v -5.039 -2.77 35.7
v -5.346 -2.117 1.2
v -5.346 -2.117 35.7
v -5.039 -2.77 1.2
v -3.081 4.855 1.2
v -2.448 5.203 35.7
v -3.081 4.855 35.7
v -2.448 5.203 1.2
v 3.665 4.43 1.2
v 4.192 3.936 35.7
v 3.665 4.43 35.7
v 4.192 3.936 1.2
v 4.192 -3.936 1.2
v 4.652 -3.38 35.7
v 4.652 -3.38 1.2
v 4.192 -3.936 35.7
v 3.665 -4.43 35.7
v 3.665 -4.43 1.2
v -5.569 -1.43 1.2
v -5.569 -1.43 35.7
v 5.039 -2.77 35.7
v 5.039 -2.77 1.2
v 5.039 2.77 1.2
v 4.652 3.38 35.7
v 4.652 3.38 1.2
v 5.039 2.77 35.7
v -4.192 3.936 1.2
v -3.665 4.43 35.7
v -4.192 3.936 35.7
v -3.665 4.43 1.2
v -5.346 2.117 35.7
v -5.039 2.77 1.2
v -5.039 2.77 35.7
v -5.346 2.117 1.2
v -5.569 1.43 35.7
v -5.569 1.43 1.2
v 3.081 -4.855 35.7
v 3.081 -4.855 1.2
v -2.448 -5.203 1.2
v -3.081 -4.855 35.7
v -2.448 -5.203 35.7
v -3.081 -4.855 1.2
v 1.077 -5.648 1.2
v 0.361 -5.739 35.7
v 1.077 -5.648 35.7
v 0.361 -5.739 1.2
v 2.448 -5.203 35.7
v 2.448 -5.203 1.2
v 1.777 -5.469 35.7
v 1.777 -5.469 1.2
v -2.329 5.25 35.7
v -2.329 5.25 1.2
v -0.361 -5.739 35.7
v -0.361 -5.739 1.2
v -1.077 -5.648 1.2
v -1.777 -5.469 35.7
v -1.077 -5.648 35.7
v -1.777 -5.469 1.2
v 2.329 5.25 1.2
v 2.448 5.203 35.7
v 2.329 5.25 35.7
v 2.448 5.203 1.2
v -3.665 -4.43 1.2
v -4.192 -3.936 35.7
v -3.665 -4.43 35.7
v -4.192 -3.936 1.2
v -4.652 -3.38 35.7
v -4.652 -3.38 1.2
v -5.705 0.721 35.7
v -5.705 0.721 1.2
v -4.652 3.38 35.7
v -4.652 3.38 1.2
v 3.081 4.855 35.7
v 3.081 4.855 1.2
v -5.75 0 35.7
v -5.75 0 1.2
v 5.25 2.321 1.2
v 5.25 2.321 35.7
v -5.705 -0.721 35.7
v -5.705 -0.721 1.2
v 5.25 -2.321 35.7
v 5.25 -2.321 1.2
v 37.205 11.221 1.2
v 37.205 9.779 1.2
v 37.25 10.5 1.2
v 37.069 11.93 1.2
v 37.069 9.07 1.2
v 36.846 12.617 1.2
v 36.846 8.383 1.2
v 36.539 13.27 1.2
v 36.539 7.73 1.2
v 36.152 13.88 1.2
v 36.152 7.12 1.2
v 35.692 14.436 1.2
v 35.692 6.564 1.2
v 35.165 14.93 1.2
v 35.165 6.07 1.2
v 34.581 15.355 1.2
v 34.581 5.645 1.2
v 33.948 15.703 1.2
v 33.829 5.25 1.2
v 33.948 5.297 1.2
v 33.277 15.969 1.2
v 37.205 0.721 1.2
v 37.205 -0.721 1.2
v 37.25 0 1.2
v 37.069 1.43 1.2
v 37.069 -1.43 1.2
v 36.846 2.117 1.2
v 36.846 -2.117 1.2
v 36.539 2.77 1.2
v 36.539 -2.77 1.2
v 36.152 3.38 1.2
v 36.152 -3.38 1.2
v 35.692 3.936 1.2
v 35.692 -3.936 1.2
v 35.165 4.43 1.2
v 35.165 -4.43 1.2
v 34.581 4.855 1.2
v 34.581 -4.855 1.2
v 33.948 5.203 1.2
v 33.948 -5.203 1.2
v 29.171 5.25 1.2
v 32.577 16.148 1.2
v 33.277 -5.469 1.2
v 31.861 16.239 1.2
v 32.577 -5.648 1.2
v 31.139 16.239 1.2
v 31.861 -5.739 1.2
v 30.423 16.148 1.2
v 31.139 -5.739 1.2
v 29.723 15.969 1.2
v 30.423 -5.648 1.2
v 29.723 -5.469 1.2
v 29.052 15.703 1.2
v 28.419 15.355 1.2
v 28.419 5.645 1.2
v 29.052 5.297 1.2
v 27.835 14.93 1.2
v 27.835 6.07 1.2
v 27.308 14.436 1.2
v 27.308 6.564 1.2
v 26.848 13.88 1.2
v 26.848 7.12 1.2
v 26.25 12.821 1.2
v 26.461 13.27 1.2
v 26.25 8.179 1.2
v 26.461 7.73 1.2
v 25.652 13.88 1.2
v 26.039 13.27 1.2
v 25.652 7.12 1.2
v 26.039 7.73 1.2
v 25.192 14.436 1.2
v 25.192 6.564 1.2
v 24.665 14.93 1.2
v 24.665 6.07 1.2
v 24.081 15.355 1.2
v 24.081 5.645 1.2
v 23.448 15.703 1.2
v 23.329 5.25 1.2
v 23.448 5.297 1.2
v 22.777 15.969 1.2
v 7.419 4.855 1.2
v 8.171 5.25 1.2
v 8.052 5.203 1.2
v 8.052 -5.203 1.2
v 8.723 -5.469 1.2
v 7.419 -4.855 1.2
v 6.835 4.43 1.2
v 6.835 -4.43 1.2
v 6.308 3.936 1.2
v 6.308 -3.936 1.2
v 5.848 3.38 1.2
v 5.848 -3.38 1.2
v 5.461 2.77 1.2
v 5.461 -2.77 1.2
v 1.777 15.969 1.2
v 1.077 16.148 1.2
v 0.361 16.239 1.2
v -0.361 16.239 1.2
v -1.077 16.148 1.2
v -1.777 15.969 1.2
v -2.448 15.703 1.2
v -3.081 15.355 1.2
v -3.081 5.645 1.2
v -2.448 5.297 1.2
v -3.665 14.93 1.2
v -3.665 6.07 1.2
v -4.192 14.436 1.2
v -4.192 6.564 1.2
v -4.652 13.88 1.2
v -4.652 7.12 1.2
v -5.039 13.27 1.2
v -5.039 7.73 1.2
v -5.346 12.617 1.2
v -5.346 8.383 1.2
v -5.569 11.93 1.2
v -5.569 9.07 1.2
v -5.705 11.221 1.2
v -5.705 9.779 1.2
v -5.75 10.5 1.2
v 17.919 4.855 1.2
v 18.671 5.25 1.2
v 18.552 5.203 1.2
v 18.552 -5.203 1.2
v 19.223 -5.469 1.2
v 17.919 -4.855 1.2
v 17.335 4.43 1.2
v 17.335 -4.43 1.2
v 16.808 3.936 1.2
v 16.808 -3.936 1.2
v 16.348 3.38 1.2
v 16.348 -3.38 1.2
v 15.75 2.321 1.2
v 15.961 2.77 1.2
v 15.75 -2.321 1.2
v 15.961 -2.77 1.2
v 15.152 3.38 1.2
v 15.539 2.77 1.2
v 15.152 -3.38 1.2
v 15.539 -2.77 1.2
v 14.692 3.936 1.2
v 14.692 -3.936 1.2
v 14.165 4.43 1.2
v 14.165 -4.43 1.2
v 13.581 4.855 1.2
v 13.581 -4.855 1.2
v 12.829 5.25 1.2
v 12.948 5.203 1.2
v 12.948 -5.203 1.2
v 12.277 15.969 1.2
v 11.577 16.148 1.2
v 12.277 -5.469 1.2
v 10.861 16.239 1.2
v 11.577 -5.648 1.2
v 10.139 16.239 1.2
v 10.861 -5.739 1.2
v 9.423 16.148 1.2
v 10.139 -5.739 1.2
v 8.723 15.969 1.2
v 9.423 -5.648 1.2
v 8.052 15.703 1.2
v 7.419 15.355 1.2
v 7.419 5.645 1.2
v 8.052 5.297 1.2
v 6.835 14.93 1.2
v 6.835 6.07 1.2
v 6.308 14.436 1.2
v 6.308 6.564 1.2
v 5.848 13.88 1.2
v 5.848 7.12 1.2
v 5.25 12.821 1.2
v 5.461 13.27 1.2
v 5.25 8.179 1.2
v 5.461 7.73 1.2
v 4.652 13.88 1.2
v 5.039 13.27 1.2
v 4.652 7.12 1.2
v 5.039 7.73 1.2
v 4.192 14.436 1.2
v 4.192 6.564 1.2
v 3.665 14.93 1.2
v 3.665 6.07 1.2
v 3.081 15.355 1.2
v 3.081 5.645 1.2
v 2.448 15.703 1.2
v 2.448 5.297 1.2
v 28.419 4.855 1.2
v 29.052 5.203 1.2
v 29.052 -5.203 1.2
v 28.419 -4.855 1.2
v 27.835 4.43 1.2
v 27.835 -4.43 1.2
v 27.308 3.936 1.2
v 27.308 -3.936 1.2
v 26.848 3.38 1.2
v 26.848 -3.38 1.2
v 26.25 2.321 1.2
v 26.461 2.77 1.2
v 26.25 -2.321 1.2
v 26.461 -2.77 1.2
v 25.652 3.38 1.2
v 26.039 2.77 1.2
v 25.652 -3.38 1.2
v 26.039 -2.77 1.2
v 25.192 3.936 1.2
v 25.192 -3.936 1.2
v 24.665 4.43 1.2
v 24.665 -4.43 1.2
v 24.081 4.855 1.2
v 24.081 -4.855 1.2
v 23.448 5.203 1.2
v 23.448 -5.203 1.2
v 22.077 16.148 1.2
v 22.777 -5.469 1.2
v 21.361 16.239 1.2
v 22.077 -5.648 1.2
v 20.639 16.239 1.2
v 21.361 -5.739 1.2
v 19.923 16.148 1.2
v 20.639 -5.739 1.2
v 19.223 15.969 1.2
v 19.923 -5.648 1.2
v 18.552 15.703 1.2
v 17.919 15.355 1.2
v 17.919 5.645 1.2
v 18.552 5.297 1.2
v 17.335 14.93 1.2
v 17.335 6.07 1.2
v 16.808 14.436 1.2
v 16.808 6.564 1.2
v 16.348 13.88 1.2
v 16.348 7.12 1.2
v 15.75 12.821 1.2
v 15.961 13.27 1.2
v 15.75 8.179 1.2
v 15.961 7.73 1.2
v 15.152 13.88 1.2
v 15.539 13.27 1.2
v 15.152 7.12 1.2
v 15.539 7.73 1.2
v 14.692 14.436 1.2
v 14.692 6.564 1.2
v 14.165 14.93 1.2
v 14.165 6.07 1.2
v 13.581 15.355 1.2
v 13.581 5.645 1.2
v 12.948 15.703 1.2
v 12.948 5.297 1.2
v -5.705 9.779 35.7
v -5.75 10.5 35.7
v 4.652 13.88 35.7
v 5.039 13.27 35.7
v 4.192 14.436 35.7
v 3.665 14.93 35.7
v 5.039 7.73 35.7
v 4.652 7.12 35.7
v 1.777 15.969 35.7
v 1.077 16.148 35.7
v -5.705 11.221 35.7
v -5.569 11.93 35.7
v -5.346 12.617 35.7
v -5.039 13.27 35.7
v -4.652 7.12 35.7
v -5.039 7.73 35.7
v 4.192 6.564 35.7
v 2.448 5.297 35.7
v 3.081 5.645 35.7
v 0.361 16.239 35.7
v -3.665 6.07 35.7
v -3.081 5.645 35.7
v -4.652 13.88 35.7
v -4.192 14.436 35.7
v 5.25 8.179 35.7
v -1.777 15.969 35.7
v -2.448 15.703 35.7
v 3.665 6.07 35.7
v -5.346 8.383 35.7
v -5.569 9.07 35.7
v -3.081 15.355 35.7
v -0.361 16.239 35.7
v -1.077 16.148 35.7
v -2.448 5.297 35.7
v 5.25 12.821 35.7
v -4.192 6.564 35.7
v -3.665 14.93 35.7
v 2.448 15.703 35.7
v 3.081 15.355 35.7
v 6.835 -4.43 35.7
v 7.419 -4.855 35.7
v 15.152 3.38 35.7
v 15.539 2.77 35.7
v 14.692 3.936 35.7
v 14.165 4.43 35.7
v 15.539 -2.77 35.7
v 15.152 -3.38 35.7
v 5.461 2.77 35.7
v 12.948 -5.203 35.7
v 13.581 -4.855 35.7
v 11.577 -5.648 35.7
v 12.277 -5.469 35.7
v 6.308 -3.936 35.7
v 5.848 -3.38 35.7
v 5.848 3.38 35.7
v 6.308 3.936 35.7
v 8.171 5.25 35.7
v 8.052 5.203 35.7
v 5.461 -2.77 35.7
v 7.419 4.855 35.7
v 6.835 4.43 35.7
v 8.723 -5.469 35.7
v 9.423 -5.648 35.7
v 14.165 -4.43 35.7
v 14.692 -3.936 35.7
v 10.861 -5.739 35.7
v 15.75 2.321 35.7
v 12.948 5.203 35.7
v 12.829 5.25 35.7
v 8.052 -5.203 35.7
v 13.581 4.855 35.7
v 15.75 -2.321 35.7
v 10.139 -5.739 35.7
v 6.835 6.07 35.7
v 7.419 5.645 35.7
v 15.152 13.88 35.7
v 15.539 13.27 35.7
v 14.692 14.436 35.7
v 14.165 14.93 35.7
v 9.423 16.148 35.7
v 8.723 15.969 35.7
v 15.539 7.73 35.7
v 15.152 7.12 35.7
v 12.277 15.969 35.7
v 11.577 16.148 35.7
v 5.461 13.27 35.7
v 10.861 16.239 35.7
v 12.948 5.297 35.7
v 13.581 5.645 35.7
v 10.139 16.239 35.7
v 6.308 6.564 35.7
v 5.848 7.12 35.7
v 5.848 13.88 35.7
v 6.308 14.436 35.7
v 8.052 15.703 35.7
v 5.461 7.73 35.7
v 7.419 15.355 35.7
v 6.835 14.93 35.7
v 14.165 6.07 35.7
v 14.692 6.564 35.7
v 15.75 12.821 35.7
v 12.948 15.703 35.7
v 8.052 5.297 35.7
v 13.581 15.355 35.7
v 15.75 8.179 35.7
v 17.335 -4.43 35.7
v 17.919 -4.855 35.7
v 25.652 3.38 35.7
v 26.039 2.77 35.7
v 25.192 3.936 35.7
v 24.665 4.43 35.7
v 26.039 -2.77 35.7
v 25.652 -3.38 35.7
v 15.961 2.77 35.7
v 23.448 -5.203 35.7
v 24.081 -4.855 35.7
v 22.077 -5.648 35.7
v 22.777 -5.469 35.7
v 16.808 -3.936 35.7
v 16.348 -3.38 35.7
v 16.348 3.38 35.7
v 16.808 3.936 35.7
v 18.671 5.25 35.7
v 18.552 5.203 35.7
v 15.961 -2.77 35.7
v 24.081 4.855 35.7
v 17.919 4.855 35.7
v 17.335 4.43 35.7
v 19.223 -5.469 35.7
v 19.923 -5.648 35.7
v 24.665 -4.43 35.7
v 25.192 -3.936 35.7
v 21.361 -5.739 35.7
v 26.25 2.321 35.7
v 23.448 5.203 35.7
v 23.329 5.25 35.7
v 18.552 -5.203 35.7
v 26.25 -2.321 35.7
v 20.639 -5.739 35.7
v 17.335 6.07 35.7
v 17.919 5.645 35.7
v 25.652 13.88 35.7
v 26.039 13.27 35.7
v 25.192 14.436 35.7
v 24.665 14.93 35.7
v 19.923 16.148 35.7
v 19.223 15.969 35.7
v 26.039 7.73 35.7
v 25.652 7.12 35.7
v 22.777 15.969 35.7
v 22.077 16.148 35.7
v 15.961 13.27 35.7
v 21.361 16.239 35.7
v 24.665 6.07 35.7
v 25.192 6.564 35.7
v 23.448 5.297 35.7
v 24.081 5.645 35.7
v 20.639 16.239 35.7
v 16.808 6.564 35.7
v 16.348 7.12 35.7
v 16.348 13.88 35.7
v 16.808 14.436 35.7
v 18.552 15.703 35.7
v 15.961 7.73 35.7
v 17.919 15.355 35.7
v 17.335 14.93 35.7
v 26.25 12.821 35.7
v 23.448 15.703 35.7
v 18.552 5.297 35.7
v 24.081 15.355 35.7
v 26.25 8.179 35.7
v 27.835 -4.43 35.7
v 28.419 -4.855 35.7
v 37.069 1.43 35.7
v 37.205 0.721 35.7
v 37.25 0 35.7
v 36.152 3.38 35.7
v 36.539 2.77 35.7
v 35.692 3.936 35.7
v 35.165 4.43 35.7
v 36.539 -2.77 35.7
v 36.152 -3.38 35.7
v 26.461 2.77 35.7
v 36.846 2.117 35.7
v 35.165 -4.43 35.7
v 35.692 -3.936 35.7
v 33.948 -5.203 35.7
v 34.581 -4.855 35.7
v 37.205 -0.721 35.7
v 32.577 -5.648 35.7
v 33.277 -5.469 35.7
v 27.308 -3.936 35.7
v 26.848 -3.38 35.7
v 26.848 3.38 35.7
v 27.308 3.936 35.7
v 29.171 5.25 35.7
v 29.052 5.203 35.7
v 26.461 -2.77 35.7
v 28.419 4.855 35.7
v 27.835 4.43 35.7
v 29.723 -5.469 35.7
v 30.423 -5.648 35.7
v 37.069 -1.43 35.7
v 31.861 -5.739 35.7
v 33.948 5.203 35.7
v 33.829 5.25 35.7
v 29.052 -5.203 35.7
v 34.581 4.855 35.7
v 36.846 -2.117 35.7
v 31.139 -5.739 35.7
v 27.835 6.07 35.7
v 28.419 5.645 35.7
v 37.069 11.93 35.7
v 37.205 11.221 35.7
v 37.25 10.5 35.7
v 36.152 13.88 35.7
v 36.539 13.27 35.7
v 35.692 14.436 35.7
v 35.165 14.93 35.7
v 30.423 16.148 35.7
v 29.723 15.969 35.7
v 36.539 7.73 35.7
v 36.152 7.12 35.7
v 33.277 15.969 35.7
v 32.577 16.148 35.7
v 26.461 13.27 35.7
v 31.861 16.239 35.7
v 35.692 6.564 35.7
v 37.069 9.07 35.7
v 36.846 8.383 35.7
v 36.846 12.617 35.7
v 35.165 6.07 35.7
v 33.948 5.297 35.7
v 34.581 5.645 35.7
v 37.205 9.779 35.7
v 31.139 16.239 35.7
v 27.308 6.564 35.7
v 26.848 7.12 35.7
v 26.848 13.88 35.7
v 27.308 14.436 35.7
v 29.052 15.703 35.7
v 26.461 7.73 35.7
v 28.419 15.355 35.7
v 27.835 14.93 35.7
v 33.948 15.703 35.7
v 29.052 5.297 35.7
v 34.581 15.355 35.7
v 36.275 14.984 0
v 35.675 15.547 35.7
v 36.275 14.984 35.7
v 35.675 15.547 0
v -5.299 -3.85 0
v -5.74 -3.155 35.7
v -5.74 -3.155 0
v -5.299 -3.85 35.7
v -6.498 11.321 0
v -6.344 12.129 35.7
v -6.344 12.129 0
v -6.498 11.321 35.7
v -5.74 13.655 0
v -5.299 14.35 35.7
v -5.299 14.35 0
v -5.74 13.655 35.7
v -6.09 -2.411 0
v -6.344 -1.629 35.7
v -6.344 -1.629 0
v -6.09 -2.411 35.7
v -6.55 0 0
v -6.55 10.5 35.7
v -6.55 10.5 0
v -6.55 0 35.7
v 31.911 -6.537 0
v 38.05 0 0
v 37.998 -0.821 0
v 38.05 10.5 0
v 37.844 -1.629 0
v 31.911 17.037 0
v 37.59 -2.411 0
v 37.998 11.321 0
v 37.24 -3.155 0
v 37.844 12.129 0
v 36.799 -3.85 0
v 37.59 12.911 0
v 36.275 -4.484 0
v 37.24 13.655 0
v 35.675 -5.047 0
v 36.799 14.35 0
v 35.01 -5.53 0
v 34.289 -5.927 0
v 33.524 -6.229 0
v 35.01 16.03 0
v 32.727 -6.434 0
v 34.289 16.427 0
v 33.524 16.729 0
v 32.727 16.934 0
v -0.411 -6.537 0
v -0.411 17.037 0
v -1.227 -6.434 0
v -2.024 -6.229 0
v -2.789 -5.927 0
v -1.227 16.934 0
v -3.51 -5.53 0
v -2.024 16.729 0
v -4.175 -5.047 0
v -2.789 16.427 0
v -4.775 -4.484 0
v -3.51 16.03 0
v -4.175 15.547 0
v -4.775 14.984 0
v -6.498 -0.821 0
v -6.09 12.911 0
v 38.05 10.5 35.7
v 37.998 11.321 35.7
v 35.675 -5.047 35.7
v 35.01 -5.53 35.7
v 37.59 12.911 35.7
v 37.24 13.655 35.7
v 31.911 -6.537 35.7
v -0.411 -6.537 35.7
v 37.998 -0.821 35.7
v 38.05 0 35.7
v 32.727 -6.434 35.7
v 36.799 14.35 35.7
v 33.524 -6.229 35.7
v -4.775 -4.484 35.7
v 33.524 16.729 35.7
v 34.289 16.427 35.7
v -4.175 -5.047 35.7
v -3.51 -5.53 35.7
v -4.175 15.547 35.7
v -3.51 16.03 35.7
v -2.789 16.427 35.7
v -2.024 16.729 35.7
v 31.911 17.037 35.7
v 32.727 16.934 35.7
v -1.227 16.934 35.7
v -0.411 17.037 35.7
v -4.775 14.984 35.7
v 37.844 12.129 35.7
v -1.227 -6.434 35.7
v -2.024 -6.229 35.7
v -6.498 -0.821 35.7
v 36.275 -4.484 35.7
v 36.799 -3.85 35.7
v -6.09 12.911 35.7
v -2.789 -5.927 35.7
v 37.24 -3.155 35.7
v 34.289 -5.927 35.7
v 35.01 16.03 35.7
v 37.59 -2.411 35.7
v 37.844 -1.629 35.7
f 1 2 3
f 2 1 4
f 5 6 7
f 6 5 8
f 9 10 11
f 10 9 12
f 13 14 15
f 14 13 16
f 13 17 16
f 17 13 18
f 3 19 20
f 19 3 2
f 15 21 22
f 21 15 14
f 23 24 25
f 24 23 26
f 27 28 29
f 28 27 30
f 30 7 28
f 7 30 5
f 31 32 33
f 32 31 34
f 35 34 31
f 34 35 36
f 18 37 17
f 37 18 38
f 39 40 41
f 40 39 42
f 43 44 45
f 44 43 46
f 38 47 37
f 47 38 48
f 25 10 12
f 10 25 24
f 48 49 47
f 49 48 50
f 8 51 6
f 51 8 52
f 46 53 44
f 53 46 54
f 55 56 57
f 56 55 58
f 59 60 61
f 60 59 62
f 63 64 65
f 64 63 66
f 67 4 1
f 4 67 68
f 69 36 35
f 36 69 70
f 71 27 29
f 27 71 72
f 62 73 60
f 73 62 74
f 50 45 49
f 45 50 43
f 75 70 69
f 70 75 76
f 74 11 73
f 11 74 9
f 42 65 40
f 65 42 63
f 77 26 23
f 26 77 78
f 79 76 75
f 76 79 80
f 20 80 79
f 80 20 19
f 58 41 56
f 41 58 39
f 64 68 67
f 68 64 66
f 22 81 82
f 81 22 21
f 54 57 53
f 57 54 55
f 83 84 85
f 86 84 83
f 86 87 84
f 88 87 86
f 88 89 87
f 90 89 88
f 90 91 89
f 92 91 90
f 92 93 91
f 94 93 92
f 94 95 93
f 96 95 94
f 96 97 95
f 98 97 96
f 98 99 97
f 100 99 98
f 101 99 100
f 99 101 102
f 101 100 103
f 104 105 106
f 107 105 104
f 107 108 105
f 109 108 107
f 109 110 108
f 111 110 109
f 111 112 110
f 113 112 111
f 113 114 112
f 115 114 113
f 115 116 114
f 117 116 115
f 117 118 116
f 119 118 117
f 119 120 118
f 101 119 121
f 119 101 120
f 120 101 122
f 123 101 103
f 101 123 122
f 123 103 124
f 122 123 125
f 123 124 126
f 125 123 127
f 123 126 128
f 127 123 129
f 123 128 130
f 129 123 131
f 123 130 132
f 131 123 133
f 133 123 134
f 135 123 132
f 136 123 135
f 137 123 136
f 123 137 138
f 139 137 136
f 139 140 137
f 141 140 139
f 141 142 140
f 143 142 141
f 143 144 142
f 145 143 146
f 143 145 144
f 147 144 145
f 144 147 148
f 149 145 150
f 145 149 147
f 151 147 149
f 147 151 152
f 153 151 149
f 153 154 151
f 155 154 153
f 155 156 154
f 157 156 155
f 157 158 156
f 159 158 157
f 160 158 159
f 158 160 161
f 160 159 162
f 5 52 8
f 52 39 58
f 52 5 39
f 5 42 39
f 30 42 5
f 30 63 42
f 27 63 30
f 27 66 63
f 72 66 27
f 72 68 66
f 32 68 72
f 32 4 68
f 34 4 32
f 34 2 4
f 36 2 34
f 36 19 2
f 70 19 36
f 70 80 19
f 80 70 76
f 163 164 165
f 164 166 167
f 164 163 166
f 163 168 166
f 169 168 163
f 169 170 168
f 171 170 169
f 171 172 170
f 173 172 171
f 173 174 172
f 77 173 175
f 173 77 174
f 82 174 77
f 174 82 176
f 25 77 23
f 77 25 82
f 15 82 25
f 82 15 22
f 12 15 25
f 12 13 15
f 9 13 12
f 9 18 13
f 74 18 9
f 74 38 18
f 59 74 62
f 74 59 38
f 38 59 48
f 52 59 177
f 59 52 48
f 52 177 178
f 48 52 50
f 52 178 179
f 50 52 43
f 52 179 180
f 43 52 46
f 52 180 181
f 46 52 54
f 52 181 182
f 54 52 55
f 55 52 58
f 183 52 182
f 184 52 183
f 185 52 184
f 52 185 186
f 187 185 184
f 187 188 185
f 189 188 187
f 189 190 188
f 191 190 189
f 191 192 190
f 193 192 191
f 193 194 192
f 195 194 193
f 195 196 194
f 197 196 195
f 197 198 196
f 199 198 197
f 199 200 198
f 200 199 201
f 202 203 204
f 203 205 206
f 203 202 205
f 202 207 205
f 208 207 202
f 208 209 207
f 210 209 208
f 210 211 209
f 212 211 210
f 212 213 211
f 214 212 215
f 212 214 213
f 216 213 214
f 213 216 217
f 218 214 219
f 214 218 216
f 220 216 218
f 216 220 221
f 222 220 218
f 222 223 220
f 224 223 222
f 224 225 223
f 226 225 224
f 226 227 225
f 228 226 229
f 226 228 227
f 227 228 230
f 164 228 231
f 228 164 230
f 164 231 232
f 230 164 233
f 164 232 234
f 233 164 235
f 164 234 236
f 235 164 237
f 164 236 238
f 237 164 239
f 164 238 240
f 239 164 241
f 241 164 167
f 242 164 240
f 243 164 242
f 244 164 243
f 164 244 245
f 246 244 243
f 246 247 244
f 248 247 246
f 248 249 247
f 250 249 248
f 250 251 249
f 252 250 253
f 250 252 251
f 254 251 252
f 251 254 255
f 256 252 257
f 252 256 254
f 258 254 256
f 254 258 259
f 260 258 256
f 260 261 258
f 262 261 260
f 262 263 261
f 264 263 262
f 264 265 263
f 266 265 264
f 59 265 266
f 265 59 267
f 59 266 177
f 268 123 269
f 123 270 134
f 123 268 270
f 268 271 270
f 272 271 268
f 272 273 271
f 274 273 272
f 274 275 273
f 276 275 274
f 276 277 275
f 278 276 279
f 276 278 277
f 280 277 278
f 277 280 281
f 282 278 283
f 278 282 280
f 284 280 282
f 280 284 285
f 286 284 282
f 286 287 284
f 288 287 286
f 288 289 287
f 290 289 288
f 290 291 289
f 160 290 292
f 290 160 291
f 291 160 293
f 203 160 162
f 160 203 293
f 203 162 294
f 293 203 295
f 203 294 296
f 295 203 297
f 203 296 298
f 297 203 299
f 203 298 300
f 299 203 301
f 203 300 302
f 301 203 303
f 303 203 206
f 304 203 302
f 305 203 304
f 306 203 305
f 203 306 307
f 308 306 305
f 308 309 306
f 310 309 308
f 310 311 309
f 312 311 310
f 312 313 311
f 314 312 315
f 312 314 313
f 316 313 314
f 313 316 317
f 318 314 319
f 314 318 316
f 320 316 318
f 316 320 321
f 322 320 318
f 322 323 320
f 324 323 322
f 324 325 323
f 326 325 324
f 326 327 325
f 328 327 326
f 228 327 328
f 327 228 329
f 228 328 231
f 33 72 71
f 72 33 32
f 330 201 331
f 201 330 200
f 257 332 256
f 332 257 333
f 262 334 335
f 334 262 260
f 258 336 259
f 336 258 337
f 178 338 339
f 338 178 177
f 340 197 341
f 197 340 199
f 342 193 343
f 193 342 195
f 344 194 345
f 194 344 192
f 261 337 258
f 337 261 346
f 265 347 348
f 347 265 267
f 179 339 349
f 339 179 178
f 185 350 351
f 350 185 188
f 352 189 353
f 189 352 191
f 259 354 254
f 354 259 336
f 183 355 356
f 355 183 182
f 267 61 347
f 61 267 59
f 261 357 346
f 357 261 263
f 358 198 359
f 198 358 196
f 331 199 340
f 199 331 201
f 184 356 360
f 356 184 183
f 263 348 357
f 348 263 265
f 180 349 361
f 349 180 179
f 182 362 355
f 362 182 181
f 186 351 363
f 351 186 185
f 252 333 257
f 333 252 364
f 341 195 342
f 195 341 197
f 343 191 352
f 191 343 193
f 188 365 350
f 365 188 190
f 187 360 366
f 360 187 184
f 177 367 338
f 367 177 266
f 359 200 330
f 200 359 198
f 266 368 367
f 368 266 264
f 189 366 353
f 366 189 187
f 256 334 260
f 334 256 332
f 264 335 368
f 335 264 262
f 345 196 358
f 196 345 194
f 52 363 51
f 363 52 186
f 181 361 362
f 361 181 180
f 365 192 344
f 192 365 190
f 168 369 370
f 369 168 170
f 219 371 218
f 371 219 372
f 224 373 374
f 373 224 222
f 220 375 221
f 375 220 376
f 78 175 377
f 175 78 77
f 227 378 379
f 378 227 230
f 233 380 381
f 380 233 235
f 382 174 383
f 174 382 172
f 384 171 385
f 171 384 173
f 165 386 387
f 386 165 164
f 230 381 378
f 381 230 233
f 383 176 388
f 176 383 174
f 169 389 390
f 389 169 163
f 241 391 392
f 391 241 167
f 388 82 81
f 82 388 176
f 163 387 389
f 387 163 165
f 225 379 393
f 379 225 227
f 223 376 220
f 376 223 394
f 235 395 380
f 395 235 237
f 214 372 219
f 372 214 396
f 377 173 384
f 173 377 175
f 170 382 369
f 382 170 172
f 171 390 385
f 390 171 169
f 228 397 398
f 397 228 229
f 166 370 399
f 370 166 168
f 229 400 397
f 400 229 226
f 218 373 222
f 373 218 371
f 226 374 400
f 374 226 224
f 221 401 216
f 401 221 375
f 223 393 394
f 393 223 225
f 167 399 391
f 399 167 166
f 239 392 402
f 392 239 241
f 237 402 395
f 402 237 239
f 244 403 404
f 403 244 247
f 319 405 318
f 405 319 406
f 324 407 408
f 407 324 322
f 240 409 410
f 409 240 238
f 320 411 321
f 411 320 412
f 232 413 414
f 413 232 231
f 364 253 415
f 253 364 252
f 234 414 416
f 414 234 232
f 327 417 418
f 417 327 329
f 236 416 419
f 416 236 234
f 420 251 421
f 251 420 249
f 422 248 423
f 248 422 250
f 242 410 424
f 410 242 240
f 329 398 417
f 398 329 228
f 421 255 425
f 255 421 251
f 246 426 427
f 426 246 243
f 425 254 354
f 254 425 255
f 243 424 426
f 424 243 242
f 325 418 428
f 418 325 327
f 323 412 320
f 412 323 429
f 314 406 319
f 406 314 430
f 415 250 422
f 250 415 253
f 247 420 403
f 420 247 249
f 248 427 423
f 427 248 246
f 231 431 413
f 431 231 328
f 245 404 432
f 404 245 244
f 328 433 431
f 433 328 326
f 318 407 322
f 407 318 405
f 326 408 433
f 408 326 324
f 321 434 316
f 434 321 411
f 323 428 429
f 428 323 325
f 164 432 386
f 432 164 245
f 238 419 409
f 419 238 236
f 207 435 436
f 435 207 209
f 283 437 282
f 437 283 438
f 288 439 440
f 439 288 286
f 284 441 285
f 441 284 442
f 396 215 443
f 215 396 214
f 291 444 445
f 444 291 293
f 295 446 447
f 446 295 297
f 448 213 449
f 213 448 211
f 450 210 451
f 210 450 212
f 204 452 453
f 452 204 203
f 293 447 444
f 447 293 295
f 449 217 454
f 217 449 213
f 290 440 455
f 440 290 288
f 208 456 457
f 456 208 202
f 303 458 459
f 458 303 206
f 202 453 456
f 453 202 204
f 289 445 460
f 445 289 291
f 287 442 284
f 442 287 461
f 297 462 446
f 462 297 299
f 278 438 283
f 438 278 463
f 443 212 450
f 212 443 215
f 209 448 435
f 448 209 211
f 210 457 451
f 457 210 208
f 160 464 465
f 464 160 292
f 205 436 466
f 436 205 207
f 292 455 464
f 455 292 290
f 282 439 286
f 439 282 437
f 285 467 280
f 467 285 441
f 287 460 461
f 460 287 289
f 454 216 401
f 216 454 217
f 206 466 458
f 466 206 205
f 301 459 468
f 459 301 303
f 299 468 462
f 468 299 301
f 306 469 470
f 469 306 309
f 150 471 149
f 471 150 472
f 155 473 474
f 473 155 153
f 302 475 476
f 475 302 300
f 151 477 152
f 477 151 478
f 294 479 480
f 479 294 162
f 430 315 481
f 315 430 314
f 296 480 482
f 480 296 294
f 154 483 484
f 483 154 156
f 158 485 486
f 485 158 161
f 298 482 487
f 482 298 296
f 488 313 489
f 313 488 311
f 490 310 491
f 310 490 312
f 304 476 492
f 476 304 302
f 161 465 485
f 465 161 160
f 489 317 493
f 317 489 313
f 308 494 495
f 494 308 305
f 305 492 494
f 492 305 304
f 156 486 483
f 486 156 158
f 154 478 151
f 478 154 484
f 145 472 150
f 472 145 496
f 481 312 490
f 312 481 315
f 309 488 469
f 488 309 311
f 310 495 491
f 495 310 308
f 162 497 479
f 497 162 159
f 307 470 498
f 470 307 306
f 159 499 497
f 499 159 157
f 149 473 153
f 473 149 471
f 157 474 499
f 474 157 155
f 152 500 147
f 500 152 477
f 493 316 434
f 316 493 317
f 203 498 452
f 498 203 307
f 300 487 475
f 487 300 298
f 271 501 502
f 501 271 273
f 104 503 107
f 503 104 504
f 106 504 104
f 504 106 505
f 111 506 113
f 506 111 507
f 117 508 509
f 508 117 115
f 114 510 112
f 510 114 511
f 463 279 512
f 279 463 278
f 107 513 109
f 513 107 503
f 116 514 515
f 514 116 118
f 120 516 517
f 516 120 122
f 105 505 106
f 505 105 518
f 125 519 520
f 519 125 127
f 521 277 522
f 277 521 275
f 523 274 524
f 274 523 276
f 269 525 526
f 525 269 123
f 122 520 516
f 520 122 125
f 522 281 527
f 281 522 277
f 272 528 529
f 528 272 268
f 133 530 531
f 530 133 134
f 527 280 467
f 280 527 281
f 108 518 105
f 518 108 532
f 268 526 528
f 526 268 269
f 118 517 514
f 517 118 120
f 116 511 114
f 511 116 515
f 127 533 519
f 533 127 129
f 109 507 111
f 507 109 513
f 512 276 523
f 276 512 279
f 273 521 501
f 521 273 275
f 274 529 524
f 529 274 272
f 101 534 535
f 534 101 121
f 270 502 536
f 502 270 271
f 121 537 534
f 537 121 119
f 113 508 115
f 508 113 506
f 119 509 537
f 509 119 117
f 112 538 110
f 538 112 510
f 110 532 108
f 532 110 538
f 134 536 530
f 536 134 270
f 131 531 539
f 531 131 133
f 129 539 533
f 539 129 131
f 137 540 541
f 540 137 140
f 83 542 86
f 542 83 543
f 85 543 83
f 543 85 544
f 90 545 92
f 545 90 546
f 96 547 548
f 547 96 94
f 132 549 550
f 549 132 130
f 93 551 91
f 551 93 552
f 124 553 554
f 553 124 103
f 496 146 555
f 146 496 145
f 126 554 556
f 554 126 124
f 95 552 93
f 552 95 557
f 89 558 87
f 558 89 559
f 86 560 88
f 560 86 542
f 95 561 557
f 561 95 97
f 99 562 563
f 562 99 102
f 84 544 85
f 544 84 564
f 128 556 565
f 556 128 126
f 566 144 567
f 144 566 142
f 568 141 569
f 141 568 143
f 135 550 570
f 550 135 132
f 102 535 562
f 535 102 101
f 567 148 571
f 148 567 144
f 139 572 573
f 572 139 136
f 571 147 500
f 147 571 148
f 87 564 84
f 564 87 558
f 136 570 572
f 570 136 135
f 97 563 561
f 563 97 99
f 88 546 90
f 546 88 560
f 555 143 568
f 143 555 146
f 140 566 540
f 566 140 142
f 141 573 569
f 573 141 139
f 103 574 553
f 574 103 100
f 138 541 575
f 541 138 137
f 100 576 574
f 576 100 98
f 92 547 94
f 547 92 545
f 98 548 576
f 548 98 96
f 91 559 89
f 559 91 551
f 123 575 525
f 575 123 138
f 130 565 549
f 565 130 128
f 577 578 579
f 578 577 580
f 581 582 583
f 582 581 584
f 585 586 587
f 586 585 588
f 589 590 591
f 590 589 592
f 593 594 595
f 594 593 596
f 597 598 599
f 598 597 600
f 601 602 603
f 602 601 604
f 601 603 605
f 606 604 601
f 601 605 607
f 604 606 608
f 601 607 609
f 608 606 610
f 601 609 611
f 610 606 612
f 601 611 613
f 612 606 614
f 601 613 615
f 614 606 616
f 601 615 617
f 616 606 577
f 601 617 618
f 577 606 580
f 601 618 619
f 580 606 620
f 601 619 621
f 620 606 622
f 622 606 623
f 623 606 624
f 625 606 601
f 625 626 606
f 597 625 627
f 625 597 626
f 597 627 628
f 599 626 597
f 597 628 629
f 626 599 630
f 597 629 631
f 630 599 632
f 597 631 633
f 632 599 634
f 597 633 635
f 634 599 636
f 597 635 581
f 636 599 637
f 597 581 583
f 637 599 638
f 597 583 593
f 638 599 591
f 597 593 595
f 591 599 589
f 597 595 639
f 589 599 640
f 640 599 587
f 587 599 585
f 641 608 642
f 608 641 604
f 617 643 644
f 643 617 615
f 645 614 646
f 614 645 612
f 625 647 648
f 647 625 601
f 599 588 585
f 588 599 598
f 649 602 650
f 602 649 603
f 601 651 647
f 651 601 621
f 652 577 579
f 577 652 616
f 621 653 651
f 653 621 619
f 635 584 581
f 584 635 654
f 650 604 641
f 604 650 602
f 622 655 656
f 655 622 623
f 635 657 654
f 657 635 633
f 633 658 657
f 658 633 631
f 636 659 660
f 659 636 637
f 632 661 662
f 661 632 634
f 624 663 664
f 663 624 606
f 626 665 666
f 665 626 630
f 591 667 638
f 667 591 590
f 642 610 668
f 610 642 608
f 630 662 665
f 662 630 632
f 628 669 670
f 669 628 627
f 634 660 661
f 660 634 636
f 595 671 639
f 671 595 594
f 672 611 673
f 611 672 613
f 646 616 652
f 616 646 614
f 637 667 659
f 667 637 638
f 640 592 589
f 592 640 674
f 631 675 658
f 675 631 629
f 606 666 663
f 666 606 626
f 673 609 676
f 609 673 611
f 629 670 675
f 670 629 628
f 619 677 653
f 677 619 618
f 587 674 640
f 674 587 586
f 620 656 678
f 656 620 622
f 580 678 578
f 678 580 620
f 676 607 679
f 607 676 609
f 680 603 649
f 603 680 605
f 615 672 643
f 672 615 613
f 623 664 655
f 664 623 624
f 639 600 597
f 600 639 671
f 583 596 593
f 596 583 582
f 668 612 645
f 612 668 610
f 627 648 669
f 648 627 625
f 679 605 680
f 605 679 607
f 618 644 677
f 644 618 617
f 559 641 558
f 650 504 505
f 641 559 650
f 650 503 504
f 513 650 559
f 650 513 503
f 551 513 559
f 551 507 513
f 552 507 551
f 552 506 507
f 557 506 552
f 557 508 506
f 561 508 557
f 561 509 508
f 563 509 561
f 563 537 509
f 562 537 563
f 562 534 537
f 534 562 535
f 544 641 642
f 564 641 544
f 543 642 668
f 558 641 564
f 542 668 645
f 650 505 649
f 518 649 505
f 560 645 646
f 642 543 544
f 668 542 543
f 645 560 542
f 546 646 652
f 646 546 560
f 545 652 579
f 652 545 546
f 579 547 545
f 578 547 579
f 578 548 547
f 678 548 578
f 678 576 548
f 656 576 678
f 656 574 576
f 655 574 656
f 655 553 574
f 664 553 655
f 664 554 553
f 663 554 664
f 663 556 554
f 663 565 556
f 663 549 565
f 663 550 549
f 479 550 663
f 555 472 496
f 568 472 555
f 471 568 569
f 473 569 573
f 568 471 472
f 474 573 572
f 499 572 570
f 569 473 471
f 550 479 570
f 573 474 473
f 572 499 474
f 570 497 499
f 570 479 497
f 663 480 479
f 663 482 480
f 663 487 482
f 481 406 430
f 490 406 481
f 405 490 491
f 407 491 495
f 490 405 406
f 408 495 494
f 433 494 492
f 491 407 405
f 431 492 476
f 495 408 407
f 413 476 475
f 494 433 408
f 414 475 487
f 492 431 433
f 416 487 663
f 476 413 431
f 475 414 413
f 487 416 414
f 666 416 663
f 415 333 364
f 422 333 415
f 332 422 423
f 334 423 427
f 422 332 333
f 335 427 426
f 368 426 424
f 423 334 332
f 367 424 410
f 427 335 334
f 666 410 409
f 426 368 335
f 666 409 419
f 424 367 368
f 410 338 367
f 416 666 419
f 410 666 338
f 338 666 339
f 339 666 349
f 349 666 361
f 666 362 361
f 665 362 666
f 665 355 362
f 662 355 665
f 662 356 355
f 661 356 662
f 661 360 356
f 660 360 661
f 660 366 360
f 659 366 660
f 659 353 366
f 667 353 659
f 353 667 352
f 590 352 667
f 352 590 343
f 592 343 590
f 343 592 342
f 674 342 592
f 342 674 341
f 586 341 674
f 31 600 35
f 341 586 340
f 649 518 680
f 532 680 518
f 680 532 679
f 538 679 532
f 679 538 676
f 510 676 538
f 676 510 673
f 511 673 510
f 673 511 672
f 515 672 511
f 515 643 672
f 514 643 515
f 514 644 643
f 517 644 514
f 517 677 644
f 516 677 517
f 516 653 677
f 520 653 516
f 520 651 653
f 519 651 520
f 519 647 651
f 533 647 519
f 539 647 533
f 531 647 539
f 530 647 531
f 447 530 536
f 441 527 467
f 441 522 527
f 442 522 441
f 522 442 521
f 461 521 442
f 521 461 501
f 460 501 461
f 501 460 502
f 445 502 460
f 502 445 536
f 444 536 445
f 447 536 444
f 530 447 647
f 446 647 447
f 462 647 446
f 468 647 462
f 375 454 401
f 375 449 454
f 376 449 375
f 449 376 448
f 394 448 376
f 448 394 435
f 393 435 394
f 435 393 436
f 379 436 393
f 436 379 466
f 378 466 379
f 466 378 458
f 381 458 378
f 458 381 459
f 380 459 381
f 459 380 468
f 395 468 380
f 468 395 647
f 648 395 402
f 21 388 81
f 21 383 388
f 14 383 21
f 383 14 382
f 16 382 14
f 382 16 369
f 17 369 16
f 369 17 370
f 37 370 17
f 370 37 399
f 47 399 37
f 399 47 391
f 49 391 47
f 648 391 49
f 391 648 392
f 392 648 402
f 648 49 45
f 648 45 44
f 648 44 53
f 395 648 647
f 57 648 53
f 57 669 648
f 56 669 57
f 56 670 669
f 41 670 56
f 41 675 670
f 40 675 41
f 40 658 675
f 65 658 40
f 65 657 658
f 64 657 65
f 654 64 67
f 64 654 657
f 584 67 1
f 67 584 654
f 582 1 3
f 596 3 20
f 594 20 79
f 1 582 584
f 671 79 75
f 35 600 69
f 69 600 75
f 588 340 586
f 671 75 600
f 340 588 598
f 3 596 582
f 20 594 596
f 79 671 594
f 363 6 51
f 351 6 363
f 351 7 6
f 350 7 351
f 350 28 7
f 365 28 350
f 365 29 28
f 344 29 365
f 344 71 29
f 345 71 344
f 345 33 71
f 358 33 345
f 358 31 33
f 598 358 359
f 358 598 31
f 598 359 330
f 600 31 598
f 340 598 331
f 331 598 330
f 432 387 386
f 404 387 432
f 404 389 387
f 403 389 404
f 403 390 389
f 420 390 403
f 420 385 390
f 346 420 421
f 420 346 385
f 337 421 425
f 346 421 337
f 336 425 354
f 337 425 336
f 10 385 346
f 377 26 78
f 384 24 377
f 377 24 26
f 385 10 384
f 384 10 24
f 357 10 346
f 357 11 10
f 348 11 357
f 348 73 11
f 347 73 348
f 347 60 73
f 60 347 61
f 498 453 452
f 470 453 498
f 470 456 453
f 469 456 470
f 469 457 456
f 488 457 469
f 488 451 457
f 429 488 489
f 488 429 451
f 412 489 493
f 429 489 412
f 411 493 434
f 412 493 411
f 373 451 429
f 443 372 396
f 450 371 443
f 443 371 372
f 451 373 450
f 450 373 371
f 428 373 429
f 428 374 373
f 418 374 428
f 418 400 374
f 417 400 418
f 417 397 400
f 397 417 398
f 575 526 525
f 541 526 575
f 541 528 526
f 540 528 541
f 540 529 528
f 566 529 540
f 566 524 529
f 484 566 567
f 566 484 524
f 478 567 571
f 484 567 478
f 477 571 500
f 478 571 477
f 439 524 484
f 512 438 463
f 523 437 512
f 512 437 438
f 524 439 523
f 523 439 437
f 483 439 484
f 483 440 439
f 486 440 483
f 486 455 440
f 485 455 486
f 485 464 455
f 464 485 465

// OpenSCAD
$fn = 50;

batDia = 10.5;
batHeight = 44.5;

rows = 4;
cols = 2;

shellWidth = 1.6;
shellHeight = 1.2;

topHeight = 10;

box(batHeight - topHeight);

module box(height){
    
    difference(){
    
        hull(){
            
            cylinder(d = batDia + shellWidth + 1, h = height + shellHeight);
            
            translate([(rows - 1) * batDia,0,0])
            cylinder(d = batDia + shellWidth  + 1, h = height + shellHeight);
            
            translate([(rows - 1) * batDia,(cols - 1) * batDia,0])
            cylinder(d = batDia + shellWidth + 1, h = height + shellHeight);
            
            translate([0,(cols - 1) * batDia,0])
            cylinder(d = batDia + shellWidth  + 1, h = height + shellHeight);
            
        }
        
        for(i = [0 : rows-1]){
            
            for(j = [0 : cols-1]){
                
                #translate([i * batDia, j*batDia, shellHeight])
                cylinder(d = batDia + 1, h = batHeight);
                
            }
            
        }
        
    }
    
}
